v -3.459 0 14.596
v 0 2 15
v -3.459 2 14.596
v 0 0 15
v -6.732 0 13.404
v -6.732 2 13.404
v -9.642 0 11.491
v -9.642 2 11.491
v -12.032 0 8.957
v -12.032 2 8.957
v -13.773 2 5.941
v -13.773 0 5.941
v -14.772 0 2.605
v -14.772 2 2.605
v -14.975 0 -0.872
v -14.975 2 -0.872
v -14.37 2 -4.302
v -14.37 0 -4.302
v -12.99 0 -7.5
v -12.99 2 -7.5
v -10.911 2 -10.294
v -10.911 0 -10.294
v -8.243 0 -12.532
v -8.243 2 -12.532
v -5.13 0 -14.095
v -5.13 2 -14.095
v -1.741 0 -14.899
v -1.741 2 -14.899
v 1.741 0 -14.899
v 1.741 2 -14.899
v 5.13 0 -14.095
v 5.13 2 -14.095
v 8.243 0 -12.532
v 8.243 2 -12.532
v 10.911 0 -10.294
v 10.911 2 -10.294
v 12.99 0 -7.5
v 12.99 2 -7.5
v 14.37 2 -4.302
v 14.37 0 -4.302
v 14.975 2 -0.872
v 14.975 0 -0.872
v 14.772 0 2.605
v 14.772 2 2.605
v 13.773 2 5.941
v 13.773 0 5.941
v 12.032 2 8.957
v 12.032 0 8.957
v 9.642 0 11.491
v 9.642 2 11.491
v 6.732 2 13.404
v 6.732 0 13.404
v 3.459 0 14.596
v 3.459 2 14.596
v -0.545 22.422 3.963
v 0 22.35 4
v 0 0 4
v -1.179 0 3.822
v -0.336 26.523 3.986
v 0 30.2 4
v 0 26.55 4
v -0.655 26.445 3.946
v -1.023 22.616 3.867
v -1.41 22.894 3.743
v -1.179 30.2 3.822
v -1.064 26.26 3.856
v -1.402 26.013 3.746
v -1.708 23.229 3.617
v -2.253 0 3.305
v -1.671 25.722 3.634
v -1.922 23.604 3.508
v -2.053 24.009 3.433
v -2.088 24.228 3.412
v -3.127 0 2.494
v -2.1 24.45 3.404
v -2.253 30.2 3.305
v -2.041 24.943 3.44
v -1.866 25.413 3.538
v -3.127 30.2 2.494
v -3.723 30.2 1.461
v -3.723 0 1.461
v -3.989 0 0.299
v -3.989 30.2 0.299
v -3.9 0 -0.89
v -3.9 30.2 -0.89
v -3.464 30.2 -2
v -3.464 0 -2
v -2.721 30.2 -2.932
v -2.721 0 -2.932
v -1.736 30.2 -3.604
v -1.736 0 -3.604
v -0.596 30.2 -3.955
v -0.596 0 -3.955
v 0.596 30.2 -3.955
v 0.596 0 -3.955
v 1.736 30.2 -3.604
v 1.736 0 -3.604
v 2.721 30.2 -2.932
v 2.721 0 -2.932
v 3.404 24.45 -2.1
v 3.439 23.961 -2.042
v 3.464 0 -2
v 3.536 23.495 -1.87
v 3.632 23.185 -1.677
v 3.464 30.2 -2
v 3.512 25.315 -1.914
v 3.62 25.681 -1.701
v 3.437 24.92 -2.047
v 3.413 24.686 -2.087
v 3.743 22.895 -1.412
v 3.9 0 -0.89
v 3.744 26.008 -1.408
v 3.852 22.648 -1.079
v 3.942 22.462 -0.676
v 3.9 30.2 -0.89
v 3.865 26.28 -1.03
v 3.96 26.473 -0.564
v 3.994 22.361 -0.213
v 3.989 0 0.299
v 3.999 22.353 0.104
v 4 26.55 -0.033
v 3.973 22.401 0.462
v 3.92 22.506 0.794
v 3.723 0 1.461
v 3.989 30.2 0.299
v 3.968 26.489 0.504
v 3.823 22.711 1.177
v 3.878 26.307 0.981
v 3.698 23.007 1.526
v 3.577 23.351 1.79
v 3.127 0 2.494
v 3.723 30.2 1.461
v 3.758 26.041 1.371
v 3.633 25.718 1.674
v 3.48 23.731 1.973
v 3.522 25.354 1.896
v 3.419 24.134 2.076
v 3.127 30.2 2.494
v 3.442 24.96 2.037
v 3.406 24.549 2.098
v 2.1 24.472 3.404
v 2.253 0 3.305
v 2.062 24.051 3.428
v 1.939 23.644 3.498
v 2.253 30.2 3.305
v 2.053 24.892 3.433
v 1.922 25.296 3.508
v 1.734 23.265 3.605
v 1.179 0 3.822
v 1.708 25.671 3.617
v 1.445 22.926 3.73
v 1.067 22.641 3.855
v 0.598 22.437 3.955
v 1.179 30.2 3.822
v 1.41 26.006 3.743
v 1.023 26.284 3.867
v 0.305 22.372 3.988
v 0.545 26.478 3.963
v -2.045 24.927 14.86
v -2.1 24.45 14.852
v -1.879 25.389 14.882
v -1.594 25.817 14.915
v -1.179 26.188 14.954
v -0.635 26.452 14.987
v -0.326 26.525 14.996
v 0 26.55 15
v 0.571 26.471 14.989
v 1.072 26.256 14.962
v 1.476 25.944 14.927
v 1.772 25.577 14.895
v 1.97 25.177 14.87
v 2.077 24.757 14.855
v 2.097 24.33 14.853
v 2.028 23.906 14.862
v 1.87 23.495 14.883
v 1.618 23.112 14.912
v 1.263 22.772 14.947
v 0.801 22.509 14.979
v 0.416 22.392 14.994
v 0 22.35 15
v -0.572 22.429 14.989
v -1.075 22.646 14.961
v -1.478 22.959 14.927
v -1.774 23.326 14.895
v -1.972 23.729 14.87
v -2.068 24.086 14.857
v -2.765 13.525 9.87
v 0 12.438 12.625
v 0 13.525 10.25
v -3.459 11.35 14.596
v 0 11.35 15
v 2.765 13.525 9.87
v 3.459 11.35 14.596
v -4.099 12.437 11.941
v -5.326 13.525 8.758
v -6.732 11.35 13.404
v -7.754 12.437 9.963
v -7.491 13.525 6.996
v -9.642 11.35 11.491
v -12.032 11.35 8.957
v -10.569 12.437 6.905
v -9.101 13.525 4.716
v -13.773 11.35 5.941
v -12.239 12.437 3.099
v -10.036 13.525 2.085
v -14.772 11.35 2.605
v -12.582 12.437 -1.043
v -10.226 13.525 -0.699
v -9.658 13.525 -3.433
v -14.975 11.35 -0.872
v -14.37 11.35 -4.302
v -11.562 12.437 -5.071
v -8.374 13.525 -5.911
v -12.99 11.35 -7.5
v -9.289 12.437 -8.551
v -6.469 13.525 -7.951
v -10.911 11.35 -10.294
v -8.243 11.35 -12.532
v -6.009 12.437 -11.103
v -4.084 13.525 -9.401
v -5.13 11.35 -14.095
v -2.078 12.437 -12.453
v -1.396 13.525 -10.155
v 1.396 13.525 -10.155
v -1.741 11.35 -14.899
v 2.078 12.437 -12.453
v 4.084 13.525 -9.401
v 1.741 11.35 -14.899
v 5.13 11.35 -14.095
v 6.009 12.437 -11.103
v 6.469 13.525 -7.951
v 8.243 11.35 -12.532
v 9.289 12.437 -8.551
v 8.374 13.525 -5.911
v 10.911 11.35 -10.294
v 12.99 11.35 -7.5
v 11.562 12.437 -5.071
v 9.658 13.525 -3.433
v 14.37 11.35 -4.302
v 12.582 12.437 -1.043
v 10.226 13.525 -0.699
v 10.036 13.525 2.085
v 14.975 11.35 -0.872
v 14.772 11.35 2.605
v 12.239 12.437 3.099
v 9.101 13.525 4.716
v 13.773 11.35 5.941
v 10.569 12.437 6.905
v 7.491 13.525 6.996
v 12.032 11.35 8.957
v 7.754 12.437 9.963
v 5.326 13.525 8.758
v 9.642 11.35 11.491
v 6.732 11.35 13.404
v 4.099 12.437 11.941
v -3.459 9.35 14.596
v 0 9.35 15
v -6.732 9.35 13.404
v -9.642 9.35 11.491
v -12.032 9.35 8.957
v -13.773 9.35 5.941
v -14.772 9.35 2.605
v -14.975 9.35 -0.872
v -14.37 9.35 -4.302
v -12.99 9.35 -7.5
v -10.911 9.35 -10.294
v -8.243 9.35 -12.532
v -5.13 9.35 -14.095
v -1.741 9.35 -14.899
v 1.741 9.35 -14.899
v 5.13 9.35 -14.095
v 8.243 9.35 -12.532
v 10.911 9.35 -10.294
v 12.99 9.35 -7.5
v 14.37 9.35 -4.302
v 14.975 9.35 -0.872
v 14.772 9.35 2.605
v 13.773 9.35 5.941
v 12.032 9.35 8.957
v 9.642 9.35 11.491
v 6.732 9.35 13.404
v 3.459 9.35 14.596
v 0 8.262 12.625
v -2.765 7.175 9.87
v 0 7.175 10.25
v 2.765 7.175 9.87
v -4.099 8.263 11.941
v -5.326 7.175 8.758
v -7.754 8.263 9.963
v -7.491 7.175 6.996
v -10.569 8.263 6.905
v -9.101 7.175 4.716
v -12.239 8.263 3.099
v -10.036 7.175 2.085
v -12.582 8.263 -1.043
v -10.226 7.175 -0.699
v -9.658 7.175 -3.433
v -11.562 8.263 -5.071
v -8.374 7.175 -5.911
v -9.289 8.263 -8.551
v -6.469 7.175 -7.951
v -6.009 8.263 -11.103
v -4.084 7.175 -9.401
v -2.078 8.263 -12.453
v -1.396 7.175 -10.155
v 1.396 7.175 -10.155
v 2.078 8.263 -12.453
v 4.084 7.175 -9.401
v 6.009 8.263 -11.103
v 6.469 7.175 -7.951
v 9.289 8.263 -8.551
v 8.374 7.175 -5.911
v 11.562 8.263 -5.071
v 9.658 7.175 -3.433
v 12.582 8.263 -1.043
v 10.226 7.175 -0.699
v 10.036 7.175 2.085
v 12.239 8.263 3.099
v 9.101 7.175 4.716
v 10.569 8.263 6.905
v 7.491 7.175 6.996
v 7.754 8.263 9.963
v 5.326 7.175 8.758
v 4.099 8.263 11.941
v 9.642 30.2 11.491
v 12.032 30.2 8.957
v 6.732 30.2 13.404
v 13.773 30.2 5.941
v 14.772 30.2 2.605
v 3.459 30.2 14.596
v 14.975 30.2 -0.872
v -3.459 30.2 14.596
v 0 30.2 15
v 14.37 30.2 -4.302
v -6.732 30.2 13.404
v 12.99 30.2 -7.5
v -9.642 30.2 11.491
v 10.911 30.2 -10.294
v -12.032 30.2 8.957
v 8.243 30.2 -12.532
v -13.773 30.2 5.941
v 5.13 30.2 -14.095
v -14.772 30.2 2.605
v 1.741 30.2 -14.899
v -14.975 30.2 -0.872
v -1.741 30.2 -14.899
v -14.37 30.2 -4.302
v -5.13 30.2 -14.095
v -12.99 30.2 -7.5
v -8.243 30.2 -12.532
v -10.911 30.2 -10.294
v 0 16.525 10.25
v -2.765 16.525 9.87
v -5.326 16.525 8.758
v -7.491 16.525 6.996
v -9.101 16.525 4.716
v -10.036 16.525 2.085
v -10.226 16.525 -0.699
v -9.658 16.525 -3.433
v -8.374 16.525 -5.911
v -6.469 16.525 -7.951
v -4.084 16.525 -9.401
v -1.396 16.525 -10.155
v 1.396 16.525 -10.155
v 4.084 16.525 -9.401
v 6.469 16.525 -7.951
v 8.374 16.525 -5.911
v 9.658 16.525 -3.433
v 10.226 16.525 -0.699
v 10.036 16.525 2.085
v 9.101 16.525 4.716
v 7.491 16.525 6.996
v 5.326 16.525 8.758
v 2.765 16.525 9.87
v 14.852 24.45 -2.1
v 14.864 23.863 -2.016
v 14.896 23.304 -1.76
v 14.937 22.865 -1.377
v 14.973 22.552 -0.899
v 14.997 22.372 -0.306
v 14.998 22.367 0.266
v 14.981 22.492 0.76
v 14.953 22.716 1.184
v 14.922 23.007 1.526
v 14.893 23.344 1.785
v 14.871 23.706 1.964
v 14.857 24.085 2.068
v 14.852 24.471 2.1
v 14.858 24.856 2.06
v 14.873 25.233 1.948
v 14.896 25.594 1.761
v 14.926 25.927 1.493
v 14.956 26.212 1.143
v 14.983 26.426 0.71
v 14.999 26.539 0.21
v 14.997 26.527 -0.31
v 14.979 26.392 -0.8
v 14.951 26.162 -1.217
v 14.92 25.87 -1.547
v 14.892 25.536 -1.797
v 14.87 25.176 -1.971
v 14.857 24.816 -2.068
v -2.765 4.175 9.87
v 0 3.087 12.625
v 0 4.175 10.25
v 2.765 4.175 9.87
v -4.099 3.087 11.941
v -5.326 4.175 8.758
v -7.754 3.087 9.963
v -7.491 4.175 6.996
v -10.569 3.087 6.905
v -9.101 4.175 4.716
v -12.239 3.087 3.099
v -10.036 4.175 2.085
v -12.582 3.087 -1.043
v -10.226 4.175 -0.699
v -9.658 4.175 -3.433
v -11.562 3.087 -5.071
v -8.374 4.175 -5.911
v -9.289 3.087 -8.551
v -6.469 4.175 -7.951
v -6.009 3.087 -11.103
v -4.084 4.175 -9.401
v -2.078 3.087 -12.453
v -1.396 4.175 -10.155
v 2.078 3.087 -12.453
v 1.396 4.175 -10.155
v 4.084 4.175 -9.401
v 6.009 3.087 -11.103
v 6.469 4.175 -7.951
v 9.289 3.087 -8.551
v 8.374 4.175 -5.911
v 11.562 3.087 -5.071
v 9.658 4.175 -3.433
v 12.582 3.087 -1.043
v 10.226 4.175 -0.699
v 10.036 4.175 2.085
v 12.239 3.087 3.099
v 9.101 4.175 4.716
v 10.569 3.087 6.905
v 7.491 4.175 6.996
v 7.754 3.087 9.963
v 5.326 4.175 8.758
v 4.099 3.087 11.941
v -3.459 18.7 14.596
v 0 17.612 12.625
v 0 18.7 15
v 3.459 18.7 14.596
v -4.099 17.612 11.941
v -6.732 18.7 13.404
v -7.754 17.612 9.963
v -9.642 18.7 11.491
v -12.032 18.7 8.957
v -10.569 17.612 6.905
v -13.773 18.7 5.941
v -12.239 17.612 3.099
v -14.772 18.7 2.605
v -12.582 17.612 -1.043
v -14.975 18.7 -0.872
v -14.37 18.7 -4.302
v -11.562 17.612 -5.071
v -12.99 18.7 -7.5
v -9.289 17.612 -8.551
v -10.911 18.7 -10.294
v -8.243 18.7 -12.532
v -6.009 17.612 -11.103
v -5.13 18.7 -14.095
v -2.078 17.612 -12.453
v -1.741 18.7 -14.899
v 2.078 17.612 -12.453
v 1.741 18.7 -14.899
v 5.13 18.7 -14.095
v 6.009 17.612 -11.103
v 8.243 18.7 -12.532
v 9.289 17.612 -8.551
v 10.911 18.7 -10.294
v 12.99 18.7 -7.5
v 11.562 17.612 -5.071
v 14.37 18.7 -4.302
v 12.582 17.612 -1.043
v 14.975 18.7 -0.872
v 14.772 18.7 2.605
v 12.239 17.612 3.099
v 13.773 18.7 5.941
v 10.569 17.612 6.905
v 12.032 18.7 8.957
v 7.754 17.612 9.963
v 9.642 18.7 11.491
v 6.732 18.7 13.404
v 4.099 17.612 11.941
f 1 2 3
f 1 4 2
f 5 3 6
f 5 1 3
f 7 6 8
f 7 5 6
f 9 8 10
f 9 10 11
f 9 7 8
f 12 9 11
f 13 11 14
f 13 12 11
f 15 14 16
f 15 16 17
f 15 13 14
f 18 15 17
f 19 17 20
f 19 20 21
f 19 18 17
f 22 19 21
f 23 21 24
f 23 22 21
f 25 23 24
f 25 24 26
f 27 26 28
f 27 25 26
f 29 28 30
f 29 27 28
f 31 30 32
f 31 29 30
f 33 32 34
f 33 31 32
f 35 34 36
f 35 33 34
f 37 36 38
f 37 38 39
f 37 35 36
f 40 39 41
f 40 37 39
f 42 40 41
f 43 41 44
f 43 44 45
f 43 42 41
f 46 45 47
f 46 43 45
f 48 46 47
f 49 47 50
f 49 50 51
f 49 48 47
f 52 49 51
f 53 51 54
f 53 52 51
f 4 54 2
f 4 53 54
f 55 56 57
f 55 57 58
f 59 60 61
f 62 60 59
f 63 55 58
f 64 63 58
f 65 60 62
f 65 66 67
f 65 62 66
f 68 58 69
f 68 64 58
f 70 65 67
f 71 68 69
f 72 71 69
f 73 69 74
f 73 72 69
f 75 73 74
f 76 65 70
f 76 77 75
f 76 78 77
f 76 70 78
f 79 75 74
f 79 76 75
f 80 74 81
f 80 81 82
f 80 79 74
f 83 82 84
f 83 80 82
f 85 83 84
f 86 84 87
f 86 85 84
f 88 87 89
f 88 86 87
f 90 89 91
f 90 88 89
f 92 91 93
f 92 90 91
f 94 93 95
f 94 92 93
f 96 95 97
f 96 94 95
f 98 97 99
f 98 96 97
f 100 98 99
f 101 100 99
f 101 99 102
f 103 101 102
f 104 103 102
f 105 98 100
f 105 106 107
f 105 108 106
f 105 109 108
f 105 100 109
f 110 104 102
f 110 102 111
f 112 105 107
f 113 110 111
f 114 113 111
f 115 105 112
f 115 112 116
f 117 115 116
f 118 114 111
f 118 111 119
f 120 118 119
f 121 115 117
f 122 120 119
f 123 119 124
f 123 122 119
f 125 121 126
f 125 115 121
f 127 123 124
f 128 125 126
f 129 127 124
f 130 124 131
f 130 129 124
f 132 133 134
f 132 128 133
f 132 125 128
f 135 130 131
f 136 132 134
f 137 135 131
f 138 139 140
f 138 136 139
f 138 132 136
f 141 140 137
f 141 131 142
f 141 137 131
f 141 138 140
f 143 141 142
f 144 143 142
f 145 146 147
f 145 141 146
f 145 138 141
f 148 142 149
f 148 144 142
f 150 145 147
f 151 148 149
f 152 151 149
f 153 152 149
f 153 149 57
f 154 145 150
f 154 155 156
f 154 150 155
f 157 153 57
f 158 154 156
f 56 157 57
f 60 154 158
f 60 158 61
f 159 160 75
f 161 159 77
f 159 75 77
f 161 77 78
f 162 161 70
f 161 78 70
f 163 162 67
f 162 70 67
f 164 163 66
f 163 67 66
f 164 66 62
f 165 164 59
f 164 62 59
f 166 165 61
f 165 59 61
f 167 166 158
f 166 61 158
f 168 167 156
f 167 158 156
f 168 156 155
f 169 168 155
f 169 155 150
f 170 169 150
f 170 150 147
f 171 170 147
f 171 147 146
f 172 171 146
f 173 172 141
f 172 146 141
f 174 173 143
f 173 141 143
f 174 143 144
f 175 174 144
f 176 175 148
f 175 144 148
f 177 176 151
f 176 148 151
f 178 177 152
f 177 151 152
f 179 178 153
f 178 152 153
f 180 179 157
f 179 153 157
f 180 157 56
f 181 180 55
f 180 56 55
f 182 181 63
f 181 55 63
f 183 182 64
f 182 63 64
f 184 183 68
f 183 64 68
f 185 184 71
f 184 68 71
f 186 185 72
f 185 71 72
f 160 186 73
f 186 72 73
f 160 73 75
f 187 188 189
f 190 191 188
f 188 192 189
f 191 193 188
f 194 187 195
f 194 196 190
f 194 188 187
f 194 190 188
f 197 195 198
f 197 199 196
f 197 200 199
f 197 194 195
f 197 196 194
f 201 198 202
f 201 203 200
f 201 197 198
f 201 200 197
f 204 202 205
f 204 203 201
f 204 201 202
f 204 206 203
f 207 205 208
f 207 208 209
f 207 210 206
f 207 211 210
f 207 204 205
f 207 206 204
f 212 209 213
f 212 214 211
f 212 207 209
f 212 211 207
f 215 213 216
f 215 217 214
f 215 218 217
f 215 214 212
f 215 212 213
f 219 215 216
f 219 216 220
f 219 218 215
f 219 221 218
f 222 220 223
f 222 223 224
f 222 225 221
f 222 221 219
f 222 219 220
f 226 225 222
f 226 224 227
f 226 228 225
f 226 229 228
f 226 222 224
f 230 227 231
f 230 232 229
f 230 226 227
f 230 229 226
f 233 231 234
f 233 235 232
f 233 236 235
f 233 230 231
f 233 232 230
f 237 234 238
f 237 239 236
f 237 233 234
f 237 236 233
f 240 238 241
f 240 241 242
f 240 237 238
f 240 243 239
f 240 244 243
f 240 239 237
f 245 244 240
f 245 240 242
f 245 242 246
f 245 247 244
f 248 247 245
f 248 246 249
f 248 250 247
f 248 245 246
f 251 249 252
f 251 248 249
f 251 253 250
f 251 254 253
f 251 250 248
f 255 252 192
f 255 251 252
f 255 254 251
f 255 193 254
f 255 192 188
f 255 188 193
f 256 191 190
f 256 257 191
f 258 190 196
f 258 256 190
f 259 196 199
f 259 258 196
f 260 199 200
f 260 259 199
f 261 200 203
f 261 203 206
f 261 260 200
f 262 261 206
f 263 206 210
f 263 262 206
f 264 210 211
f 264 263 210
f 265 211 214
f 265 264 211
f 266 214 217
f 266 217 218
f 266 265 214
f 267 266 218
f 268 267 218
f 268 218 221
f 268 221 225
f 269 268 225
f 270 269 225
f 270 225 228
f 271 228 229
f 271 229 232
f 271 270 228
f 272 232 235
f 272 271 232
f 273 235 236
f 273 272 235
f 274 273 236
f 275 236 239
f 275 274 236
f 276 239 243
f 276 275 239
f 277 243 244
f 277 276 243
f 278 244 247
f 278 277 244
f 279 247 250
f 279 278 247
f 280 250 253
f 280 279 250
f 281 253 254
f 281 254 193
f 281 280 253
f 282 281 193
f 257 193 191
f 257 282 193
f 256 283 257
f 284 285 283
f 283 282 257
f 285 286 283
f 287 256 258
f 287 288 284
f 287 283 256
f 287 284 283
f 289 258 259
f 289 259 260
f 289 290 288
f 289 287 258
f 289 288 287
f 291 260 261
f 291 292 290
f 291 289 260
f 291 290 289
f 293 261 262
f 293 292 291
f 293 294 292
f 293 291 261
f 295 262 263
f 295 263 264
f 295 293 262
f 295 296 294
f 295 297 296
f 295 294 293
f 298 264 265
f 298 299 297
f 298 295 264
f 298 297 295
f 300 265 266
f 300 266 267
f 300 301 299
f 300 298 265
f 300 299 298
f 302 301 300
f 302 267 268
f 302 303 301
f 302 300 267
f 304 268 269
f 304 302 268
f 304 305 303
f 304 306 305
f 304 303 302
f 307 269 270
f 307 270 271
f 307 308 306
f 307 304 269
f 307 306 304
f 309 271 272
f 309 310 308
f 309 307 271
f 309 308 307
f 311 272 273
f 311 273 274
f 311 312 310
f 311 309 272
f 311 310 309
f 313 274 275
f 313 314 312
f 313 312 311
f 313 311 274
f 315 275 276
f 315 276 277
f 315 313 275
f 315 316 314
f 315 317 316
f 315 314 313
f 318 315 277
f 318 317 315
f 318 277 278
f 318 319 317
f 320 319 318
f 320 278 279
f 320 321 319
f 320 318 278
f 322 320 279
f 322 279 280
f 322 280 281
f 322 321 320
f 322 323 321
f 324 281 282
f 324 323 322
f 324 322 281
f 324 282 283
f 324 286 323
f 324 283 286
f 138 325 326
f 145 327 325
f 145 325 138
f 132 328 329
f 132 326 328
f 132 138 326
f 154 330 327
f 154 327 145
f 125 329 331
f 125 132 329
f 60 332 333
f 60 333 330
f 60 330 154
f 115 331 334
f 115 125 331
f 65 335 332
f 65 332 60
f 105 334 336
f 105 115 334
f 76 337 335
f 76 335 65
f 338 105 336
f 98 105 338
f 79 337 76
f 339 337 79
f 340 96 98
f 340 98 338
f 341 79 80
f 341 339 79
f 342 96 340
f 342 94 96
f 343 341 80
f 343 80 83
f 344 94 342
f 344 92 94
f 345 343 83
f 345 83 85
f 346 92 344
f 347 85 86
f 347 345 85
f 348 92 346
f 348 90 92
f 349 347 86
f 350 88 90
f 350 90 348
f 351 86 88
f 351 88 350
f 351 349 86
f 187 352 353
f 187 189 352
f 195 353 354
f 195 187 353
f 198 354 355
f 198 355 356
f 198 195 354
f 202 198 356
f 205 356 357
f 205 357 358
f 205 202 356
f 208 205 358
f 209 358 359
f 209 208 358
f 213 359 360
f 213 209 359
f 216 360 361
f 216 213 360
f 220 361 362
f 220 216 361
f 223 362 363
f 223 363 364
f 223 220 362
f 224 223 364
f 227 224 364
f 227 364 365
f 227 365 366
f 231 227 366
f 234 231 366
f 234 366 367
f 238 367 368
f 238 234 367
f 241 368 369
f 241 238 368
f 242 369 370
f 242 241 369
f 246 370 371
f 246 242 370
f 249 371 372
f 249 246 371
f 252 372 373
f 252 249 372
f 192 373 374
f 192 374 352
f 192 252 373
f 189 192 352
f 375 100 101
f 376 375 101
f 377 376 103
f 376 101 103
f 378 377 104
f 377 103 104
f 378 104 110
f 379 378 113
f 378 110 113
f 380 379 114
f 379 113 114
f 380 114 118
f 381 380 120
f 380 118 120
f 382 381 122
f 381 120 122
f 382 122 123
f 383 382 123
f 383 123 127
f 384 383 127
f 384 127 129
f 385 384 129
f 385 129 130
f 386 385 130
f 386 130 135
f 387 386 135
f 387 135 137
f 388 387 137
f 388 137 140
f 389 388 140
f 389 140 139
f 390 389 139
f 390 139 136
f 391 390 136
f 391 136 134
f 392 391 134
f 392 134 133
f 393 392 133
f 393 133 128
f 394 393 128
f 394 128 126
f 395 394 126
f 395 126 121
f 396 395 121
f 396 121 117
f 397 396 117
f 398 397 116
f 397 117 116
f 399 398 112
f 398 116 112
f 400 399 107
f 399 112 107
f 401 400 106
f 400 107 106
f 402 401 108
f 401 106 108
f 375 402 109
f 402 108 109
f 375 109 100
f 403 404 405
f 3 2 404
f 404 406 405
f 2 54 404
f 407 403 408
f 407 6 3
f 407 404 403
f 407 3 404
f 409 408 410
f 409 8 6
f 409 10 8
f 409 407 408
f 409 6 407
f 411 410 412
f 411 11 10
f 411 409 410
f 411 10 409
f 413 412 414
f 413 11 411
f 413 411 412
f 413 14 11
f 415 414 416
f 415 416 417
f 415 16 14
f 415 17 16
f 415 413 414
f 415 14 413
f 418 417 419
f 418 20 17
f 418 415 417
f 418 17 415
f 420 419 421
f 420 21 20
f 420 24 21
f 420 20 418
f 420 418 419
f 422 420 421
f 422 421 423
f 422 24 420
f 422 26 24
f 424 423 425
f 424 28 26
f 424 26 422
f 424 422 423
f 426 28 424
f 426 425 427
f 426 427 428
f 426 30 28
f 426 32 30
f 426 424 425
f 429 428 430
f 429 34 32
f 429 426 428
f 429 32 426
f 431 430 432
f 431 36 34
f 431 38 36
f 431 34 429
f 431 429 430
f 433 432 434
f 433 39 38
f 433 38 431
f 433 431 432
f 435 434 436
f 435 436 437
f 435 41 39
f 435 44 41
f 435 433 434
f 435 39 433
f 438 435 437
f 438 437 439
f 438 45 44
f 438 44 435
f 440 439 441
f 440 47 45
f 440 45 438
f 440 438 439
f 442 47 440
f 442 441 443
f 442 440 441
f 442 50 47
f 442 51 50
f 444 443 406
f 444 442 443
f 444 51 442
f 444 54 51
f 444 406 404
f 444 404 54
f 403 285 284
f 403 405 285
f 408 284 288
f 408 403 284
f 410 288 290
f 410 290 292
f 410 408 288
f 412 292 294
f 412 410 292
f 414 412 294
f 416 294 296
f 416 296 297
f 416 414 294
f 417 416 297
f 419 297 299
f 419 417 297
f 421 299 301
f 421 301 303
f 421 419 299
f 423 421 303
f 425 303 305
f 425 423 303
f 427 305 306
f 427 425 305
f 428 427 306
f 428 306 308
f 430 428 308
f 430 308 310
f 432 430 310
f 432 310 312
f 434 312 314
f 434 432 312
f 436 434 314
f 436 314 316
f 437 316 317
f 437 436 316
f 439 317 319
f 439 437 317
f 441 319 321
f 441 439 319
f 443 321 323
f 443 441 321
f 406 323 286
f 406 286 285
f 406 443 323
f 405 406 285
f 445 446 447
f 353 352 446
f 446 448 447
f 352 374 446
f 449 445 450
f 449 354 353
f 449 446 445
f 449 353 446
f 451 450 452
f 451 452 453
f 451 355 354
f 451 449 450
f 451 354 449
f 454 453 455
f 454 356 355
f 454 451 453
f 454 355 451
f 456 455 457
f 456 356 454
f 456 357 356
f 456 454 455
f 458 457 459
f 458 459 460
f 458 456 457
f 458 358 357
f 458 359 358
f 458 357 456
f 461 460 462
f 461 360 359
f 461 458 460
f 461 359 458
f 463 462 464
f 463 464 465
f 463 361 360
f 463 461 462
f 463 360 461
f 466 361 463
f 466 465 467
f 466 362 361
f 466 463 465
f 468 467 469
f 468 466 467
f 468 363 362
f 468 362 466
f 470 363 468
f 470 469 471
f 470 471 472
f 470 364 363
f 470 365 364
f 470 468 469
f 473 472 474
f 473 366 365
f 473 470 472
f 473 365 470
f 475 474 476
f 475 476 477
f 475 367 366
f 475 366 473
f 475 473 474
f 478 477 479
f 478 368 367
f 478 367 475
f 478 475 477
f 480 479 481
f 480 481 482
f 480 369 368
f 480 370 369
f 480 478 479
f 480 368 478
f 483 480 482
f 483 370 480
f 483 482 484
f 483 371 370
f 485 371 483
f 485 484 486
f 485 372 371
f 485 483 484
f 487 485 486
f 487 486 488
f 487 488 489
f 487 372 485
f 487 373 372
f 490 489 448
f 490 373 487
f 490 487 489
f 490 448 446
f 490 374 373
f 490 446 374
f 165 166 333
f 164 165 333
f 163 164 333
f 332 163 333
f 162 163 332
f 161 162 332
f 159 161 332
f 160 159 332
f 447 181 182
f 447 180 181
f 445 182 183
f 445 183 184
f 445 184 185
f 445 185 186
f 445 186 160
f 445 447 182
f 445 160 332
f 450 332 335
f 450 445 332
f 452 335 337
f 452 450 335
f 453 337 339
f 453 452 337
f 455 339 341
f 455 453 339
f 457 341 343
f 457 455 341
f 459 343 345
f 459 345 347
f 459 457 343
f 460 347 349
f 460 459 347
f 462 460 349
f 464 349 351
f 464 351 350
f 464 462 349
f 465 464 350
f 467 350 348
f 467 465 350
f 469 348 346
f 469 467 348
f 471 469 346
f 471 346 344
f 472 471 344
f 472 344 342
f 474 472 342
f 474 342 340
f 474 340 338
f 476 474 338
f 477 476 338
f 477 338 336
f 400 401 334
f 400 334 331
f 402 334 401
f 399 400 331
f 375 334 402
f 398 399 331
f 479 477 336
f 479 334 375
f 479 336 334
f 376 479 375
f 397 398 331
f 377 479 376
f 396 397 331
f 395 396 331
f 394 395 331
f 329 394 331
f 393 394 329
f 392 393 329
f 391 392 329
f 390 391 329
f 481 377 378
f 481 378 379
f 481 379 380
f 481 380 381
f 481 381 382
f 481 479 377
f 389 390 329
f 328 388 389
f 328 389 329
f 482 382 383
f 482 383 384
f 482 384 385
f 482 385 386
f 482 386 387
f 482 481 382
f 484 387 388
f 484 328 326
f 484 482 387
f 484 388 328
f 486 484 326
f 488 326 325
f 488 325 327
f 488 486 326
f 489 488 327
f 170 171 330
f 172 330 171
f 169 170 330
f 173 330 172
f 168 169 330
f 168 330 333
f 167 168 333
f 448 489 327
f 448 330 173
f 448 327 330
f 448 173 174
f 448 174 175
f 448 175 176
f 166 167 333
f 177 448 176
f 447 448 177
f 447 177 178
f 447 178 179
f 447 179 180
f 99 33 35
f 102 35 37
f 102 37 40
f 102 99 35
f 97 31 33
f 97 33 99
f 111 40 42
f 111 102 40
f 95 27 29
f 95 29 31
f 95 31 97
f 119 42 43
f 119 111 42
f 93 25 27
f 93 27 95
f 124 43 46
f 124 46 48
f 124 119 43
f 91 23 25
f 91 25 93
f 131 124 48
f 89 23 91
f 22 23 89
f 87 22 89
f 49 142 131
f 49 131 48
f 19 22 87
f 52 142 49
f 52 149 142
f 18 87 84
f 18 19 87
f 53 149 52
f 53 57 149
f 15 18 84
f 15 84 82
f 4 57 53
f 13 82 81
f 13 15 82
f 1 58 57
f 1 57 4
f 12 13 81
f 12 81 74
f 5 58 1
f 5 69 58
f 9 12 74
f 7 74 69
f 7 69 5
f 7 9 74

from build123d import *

# Parameters (mm, degrees)
HOLE_WIZARD_M5_2_D               = 4.2
HOLE_WIZARD_M5_2_DEPTH           = 15
HOLE_WIZARD_M5_2_ON_FACE_2_D     = 4.2
HOLE_WIZARD_M5_2_ON_FACE_2_DEPTH = 15


with BuildPart() as part:
    # 草图1 → 旋转1 (revolve)
    with BuildSketch(Plane.XY, mode=Mode.PRIVATE) as revolve_1_sk:
        Polygon((4, 30.2), (15, 30.2), (15, 18.7), (10.25, 16.525), (10.25, 13.525), (15, 11.35), (15, 9.35), (10.25, 7.175), (10.25, 4.175), (15, 2), (15, 0), (4, 0), align=None)
    revolve(revolve_1_sk.sketch.rotate(Axis((0, 48.963970588, 0), (0, -1, 0)), 90), axis=Axis((0, 48.963970588, 0), (0, -1, 0)))

    # M5 螺纹孔2
    with Locations(Plane(origin=(15, 24.45, 0), x_dir=(0, 0, 1), z_dir=(1, 0, 0))):
        with Locations((0, 0)):
            Hole(HOLE_WIZARD_M5_2_D / 2, depth=HOLE_WIZARD_M5_2_DEPTH)

    # M5 螺纹孔2 on face 2
    with Locations(Plane(origin=(0, 24.45, 15), x_dir=(1, 0, 0), z_dir=(0, 0, 1))):
        with Locations((0, 0)):
            Hole(HOLE_WIZARD_M5_2_ON_FACE_2_D / 2, depth=HOLE_WIZARD_M5_2_ON_FACE_2_DEPTH)


solid = part.part
